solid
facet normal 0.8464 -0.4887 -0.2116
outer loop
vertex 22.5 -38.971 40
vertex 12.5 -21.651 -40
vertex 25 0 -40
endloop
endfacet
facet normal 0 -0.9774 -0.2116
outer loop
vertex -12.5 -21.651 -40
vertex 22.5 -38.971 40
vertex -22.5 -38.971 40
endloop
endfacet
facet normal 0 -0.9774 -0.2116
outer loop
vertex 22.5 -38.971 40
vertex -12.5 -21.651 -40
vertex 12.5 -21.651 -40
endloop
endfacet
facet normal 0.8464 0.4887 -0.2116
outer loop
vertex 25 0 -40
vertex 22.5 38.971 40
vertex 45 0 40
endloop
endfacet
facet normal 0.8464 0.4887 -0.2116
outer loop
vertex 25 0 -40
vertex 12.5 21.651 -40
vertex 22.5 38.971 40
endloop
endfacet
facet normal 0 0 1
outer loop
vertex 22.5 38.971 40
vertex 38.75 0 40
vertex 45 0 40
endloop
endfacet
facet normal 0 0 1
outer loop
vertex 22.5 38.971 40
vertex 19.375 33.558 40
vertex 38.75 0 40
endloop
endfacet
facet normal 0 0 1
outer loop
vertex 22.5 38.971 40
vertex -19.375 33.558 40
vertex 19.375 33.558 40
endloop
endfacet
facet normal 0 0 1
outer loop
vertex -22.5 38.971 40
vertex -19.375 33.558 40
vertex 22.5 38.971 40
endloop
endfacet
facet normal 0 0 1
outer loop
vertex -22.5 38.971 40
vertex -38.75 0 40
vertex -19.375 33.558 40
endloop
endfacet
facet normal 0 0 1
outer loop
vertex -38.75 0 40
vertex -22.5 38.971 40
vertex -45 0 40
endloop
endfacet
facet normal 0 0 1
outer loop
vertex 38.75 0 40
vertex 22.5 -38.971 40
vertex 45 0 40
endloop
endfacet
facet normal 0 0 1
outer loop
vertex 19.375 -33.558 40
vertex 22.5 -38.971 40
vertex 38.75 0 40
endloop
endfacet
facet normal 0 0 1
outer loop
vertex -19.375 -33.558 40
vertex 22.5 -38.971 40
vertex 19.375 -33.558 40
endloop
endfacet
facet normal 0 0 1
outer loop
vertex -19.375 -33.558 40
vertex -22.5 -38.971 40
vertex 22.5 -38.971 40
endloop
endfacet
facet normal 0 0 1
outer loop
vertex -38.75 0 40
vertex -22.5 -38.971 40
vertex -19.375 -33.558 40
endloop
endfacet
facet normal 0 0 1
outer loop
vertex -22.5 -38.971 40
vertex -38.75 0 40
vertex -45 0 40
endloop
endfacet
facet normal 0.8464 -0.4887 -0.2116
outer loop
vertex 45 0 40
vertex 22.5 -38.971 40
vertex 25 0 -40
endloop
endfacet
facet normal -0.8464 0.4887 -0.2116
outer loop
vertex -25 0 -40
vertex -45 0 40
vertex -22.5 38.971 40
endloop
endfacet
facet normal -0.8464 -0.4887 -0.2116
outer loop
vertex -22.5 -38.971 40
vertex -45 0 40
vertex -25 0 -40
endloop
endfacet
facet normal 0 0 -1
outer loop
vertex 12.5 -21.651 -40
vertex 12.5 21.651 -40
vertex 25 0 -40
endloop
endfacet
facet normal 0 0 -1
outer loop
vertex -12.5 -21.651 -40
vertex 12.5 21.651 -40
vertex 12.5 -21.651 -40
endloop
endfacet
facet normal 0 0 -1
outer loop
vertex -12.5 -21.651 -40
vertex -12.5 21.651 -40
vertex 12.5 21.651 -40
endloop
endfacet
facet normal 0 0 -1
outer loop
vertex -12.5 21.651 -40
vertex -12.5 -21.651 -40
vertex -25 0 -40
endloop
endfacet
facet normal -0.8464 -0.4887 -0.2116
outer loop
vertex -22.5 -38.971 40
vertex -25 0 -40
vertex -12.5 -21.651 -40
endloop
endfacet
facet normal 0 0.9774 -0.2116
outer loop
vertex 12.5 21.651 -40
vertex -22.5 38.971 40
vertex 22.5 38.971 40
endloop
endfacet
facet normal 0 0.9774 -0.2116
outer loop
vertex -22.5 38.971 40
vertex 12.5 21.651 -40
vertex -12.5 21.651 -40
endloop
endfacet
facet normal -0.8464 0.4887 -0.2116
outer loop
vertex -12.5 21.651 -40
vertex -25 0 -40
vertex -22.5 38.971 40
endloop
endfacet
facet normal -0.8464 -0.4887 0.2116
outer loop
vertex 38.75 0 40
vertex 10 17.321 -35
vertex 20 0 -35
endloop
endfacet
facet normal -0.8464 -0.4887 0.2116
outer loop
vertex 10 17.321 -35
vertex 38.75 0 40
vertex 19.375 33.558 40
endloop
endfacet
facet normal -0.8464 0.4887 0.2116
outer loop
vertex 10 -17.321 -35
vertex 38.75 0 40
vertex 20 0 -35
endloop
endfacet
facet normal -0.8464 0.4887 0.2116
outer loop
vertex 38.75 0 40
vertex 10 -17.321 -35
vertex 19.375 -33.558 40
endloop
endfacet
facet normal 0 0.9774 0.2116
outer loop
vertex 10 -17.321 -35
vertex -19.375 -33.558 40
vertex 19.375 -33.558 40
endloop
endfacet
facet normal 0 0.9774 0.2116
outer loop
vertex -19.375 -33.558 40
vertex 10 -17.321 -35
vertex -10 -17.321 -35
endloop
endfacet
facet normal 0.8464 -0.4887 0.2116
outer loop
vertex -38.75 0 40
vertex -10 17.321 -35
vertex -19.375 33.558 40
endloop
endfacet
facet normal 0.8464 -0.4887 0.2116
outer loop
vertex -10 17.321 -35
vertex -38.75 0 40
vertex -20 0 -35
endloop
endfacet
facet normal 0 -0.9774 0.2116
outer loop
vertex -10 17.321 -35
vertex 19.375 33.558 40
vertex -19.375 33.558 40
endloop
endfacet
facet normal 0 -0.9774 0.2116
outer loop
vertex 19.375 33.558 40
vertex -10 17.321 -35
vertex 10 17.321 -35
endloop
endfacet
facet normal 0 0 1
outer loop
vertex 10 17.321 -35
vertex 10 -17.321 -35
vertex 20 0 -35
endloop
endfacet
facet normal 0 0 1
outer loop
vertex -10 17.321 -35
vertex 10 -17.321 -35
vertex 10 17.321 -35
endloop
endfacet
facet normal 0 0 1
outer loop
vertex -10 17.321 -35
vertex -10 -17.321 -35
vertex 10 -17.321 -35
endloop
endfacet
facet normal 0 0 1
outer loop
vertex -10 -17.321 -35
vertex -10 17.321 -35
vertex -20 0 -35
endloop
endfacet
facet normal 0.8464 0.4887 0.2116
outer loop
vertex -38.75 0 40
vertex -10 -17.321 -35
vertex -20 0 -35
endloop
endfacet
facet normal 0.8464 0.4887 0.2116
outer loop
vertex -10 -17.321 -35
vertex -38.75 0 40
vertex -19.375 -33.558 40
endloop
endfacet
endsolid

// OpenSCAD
//--Portalápices Paramétrico de base poligonal

//--Unidades en mm.www.Bioplastic3d.es

//--Parametros


Numero_Lados=6;
Diametro_Inferior=50;
Diametro_Superior=90;
Altura=80;
Grosor=5;




//--Booleana

difference(){

//--Superficie Exterior
cylinder ( r1=Diametro_Inferior/2, r2=Diametro_Superior/2,h=Altura,$fn=Numero_Lados,center=true);

//--Superficie a Sustraer

translate([0,0,Grosor])
cylinder ( r1=Diametro_Inferior/2 - Grosor, r2=Diametro_Superior/2- Grosor,h=Altura,$fn=Numero_Lados,center=true);}
